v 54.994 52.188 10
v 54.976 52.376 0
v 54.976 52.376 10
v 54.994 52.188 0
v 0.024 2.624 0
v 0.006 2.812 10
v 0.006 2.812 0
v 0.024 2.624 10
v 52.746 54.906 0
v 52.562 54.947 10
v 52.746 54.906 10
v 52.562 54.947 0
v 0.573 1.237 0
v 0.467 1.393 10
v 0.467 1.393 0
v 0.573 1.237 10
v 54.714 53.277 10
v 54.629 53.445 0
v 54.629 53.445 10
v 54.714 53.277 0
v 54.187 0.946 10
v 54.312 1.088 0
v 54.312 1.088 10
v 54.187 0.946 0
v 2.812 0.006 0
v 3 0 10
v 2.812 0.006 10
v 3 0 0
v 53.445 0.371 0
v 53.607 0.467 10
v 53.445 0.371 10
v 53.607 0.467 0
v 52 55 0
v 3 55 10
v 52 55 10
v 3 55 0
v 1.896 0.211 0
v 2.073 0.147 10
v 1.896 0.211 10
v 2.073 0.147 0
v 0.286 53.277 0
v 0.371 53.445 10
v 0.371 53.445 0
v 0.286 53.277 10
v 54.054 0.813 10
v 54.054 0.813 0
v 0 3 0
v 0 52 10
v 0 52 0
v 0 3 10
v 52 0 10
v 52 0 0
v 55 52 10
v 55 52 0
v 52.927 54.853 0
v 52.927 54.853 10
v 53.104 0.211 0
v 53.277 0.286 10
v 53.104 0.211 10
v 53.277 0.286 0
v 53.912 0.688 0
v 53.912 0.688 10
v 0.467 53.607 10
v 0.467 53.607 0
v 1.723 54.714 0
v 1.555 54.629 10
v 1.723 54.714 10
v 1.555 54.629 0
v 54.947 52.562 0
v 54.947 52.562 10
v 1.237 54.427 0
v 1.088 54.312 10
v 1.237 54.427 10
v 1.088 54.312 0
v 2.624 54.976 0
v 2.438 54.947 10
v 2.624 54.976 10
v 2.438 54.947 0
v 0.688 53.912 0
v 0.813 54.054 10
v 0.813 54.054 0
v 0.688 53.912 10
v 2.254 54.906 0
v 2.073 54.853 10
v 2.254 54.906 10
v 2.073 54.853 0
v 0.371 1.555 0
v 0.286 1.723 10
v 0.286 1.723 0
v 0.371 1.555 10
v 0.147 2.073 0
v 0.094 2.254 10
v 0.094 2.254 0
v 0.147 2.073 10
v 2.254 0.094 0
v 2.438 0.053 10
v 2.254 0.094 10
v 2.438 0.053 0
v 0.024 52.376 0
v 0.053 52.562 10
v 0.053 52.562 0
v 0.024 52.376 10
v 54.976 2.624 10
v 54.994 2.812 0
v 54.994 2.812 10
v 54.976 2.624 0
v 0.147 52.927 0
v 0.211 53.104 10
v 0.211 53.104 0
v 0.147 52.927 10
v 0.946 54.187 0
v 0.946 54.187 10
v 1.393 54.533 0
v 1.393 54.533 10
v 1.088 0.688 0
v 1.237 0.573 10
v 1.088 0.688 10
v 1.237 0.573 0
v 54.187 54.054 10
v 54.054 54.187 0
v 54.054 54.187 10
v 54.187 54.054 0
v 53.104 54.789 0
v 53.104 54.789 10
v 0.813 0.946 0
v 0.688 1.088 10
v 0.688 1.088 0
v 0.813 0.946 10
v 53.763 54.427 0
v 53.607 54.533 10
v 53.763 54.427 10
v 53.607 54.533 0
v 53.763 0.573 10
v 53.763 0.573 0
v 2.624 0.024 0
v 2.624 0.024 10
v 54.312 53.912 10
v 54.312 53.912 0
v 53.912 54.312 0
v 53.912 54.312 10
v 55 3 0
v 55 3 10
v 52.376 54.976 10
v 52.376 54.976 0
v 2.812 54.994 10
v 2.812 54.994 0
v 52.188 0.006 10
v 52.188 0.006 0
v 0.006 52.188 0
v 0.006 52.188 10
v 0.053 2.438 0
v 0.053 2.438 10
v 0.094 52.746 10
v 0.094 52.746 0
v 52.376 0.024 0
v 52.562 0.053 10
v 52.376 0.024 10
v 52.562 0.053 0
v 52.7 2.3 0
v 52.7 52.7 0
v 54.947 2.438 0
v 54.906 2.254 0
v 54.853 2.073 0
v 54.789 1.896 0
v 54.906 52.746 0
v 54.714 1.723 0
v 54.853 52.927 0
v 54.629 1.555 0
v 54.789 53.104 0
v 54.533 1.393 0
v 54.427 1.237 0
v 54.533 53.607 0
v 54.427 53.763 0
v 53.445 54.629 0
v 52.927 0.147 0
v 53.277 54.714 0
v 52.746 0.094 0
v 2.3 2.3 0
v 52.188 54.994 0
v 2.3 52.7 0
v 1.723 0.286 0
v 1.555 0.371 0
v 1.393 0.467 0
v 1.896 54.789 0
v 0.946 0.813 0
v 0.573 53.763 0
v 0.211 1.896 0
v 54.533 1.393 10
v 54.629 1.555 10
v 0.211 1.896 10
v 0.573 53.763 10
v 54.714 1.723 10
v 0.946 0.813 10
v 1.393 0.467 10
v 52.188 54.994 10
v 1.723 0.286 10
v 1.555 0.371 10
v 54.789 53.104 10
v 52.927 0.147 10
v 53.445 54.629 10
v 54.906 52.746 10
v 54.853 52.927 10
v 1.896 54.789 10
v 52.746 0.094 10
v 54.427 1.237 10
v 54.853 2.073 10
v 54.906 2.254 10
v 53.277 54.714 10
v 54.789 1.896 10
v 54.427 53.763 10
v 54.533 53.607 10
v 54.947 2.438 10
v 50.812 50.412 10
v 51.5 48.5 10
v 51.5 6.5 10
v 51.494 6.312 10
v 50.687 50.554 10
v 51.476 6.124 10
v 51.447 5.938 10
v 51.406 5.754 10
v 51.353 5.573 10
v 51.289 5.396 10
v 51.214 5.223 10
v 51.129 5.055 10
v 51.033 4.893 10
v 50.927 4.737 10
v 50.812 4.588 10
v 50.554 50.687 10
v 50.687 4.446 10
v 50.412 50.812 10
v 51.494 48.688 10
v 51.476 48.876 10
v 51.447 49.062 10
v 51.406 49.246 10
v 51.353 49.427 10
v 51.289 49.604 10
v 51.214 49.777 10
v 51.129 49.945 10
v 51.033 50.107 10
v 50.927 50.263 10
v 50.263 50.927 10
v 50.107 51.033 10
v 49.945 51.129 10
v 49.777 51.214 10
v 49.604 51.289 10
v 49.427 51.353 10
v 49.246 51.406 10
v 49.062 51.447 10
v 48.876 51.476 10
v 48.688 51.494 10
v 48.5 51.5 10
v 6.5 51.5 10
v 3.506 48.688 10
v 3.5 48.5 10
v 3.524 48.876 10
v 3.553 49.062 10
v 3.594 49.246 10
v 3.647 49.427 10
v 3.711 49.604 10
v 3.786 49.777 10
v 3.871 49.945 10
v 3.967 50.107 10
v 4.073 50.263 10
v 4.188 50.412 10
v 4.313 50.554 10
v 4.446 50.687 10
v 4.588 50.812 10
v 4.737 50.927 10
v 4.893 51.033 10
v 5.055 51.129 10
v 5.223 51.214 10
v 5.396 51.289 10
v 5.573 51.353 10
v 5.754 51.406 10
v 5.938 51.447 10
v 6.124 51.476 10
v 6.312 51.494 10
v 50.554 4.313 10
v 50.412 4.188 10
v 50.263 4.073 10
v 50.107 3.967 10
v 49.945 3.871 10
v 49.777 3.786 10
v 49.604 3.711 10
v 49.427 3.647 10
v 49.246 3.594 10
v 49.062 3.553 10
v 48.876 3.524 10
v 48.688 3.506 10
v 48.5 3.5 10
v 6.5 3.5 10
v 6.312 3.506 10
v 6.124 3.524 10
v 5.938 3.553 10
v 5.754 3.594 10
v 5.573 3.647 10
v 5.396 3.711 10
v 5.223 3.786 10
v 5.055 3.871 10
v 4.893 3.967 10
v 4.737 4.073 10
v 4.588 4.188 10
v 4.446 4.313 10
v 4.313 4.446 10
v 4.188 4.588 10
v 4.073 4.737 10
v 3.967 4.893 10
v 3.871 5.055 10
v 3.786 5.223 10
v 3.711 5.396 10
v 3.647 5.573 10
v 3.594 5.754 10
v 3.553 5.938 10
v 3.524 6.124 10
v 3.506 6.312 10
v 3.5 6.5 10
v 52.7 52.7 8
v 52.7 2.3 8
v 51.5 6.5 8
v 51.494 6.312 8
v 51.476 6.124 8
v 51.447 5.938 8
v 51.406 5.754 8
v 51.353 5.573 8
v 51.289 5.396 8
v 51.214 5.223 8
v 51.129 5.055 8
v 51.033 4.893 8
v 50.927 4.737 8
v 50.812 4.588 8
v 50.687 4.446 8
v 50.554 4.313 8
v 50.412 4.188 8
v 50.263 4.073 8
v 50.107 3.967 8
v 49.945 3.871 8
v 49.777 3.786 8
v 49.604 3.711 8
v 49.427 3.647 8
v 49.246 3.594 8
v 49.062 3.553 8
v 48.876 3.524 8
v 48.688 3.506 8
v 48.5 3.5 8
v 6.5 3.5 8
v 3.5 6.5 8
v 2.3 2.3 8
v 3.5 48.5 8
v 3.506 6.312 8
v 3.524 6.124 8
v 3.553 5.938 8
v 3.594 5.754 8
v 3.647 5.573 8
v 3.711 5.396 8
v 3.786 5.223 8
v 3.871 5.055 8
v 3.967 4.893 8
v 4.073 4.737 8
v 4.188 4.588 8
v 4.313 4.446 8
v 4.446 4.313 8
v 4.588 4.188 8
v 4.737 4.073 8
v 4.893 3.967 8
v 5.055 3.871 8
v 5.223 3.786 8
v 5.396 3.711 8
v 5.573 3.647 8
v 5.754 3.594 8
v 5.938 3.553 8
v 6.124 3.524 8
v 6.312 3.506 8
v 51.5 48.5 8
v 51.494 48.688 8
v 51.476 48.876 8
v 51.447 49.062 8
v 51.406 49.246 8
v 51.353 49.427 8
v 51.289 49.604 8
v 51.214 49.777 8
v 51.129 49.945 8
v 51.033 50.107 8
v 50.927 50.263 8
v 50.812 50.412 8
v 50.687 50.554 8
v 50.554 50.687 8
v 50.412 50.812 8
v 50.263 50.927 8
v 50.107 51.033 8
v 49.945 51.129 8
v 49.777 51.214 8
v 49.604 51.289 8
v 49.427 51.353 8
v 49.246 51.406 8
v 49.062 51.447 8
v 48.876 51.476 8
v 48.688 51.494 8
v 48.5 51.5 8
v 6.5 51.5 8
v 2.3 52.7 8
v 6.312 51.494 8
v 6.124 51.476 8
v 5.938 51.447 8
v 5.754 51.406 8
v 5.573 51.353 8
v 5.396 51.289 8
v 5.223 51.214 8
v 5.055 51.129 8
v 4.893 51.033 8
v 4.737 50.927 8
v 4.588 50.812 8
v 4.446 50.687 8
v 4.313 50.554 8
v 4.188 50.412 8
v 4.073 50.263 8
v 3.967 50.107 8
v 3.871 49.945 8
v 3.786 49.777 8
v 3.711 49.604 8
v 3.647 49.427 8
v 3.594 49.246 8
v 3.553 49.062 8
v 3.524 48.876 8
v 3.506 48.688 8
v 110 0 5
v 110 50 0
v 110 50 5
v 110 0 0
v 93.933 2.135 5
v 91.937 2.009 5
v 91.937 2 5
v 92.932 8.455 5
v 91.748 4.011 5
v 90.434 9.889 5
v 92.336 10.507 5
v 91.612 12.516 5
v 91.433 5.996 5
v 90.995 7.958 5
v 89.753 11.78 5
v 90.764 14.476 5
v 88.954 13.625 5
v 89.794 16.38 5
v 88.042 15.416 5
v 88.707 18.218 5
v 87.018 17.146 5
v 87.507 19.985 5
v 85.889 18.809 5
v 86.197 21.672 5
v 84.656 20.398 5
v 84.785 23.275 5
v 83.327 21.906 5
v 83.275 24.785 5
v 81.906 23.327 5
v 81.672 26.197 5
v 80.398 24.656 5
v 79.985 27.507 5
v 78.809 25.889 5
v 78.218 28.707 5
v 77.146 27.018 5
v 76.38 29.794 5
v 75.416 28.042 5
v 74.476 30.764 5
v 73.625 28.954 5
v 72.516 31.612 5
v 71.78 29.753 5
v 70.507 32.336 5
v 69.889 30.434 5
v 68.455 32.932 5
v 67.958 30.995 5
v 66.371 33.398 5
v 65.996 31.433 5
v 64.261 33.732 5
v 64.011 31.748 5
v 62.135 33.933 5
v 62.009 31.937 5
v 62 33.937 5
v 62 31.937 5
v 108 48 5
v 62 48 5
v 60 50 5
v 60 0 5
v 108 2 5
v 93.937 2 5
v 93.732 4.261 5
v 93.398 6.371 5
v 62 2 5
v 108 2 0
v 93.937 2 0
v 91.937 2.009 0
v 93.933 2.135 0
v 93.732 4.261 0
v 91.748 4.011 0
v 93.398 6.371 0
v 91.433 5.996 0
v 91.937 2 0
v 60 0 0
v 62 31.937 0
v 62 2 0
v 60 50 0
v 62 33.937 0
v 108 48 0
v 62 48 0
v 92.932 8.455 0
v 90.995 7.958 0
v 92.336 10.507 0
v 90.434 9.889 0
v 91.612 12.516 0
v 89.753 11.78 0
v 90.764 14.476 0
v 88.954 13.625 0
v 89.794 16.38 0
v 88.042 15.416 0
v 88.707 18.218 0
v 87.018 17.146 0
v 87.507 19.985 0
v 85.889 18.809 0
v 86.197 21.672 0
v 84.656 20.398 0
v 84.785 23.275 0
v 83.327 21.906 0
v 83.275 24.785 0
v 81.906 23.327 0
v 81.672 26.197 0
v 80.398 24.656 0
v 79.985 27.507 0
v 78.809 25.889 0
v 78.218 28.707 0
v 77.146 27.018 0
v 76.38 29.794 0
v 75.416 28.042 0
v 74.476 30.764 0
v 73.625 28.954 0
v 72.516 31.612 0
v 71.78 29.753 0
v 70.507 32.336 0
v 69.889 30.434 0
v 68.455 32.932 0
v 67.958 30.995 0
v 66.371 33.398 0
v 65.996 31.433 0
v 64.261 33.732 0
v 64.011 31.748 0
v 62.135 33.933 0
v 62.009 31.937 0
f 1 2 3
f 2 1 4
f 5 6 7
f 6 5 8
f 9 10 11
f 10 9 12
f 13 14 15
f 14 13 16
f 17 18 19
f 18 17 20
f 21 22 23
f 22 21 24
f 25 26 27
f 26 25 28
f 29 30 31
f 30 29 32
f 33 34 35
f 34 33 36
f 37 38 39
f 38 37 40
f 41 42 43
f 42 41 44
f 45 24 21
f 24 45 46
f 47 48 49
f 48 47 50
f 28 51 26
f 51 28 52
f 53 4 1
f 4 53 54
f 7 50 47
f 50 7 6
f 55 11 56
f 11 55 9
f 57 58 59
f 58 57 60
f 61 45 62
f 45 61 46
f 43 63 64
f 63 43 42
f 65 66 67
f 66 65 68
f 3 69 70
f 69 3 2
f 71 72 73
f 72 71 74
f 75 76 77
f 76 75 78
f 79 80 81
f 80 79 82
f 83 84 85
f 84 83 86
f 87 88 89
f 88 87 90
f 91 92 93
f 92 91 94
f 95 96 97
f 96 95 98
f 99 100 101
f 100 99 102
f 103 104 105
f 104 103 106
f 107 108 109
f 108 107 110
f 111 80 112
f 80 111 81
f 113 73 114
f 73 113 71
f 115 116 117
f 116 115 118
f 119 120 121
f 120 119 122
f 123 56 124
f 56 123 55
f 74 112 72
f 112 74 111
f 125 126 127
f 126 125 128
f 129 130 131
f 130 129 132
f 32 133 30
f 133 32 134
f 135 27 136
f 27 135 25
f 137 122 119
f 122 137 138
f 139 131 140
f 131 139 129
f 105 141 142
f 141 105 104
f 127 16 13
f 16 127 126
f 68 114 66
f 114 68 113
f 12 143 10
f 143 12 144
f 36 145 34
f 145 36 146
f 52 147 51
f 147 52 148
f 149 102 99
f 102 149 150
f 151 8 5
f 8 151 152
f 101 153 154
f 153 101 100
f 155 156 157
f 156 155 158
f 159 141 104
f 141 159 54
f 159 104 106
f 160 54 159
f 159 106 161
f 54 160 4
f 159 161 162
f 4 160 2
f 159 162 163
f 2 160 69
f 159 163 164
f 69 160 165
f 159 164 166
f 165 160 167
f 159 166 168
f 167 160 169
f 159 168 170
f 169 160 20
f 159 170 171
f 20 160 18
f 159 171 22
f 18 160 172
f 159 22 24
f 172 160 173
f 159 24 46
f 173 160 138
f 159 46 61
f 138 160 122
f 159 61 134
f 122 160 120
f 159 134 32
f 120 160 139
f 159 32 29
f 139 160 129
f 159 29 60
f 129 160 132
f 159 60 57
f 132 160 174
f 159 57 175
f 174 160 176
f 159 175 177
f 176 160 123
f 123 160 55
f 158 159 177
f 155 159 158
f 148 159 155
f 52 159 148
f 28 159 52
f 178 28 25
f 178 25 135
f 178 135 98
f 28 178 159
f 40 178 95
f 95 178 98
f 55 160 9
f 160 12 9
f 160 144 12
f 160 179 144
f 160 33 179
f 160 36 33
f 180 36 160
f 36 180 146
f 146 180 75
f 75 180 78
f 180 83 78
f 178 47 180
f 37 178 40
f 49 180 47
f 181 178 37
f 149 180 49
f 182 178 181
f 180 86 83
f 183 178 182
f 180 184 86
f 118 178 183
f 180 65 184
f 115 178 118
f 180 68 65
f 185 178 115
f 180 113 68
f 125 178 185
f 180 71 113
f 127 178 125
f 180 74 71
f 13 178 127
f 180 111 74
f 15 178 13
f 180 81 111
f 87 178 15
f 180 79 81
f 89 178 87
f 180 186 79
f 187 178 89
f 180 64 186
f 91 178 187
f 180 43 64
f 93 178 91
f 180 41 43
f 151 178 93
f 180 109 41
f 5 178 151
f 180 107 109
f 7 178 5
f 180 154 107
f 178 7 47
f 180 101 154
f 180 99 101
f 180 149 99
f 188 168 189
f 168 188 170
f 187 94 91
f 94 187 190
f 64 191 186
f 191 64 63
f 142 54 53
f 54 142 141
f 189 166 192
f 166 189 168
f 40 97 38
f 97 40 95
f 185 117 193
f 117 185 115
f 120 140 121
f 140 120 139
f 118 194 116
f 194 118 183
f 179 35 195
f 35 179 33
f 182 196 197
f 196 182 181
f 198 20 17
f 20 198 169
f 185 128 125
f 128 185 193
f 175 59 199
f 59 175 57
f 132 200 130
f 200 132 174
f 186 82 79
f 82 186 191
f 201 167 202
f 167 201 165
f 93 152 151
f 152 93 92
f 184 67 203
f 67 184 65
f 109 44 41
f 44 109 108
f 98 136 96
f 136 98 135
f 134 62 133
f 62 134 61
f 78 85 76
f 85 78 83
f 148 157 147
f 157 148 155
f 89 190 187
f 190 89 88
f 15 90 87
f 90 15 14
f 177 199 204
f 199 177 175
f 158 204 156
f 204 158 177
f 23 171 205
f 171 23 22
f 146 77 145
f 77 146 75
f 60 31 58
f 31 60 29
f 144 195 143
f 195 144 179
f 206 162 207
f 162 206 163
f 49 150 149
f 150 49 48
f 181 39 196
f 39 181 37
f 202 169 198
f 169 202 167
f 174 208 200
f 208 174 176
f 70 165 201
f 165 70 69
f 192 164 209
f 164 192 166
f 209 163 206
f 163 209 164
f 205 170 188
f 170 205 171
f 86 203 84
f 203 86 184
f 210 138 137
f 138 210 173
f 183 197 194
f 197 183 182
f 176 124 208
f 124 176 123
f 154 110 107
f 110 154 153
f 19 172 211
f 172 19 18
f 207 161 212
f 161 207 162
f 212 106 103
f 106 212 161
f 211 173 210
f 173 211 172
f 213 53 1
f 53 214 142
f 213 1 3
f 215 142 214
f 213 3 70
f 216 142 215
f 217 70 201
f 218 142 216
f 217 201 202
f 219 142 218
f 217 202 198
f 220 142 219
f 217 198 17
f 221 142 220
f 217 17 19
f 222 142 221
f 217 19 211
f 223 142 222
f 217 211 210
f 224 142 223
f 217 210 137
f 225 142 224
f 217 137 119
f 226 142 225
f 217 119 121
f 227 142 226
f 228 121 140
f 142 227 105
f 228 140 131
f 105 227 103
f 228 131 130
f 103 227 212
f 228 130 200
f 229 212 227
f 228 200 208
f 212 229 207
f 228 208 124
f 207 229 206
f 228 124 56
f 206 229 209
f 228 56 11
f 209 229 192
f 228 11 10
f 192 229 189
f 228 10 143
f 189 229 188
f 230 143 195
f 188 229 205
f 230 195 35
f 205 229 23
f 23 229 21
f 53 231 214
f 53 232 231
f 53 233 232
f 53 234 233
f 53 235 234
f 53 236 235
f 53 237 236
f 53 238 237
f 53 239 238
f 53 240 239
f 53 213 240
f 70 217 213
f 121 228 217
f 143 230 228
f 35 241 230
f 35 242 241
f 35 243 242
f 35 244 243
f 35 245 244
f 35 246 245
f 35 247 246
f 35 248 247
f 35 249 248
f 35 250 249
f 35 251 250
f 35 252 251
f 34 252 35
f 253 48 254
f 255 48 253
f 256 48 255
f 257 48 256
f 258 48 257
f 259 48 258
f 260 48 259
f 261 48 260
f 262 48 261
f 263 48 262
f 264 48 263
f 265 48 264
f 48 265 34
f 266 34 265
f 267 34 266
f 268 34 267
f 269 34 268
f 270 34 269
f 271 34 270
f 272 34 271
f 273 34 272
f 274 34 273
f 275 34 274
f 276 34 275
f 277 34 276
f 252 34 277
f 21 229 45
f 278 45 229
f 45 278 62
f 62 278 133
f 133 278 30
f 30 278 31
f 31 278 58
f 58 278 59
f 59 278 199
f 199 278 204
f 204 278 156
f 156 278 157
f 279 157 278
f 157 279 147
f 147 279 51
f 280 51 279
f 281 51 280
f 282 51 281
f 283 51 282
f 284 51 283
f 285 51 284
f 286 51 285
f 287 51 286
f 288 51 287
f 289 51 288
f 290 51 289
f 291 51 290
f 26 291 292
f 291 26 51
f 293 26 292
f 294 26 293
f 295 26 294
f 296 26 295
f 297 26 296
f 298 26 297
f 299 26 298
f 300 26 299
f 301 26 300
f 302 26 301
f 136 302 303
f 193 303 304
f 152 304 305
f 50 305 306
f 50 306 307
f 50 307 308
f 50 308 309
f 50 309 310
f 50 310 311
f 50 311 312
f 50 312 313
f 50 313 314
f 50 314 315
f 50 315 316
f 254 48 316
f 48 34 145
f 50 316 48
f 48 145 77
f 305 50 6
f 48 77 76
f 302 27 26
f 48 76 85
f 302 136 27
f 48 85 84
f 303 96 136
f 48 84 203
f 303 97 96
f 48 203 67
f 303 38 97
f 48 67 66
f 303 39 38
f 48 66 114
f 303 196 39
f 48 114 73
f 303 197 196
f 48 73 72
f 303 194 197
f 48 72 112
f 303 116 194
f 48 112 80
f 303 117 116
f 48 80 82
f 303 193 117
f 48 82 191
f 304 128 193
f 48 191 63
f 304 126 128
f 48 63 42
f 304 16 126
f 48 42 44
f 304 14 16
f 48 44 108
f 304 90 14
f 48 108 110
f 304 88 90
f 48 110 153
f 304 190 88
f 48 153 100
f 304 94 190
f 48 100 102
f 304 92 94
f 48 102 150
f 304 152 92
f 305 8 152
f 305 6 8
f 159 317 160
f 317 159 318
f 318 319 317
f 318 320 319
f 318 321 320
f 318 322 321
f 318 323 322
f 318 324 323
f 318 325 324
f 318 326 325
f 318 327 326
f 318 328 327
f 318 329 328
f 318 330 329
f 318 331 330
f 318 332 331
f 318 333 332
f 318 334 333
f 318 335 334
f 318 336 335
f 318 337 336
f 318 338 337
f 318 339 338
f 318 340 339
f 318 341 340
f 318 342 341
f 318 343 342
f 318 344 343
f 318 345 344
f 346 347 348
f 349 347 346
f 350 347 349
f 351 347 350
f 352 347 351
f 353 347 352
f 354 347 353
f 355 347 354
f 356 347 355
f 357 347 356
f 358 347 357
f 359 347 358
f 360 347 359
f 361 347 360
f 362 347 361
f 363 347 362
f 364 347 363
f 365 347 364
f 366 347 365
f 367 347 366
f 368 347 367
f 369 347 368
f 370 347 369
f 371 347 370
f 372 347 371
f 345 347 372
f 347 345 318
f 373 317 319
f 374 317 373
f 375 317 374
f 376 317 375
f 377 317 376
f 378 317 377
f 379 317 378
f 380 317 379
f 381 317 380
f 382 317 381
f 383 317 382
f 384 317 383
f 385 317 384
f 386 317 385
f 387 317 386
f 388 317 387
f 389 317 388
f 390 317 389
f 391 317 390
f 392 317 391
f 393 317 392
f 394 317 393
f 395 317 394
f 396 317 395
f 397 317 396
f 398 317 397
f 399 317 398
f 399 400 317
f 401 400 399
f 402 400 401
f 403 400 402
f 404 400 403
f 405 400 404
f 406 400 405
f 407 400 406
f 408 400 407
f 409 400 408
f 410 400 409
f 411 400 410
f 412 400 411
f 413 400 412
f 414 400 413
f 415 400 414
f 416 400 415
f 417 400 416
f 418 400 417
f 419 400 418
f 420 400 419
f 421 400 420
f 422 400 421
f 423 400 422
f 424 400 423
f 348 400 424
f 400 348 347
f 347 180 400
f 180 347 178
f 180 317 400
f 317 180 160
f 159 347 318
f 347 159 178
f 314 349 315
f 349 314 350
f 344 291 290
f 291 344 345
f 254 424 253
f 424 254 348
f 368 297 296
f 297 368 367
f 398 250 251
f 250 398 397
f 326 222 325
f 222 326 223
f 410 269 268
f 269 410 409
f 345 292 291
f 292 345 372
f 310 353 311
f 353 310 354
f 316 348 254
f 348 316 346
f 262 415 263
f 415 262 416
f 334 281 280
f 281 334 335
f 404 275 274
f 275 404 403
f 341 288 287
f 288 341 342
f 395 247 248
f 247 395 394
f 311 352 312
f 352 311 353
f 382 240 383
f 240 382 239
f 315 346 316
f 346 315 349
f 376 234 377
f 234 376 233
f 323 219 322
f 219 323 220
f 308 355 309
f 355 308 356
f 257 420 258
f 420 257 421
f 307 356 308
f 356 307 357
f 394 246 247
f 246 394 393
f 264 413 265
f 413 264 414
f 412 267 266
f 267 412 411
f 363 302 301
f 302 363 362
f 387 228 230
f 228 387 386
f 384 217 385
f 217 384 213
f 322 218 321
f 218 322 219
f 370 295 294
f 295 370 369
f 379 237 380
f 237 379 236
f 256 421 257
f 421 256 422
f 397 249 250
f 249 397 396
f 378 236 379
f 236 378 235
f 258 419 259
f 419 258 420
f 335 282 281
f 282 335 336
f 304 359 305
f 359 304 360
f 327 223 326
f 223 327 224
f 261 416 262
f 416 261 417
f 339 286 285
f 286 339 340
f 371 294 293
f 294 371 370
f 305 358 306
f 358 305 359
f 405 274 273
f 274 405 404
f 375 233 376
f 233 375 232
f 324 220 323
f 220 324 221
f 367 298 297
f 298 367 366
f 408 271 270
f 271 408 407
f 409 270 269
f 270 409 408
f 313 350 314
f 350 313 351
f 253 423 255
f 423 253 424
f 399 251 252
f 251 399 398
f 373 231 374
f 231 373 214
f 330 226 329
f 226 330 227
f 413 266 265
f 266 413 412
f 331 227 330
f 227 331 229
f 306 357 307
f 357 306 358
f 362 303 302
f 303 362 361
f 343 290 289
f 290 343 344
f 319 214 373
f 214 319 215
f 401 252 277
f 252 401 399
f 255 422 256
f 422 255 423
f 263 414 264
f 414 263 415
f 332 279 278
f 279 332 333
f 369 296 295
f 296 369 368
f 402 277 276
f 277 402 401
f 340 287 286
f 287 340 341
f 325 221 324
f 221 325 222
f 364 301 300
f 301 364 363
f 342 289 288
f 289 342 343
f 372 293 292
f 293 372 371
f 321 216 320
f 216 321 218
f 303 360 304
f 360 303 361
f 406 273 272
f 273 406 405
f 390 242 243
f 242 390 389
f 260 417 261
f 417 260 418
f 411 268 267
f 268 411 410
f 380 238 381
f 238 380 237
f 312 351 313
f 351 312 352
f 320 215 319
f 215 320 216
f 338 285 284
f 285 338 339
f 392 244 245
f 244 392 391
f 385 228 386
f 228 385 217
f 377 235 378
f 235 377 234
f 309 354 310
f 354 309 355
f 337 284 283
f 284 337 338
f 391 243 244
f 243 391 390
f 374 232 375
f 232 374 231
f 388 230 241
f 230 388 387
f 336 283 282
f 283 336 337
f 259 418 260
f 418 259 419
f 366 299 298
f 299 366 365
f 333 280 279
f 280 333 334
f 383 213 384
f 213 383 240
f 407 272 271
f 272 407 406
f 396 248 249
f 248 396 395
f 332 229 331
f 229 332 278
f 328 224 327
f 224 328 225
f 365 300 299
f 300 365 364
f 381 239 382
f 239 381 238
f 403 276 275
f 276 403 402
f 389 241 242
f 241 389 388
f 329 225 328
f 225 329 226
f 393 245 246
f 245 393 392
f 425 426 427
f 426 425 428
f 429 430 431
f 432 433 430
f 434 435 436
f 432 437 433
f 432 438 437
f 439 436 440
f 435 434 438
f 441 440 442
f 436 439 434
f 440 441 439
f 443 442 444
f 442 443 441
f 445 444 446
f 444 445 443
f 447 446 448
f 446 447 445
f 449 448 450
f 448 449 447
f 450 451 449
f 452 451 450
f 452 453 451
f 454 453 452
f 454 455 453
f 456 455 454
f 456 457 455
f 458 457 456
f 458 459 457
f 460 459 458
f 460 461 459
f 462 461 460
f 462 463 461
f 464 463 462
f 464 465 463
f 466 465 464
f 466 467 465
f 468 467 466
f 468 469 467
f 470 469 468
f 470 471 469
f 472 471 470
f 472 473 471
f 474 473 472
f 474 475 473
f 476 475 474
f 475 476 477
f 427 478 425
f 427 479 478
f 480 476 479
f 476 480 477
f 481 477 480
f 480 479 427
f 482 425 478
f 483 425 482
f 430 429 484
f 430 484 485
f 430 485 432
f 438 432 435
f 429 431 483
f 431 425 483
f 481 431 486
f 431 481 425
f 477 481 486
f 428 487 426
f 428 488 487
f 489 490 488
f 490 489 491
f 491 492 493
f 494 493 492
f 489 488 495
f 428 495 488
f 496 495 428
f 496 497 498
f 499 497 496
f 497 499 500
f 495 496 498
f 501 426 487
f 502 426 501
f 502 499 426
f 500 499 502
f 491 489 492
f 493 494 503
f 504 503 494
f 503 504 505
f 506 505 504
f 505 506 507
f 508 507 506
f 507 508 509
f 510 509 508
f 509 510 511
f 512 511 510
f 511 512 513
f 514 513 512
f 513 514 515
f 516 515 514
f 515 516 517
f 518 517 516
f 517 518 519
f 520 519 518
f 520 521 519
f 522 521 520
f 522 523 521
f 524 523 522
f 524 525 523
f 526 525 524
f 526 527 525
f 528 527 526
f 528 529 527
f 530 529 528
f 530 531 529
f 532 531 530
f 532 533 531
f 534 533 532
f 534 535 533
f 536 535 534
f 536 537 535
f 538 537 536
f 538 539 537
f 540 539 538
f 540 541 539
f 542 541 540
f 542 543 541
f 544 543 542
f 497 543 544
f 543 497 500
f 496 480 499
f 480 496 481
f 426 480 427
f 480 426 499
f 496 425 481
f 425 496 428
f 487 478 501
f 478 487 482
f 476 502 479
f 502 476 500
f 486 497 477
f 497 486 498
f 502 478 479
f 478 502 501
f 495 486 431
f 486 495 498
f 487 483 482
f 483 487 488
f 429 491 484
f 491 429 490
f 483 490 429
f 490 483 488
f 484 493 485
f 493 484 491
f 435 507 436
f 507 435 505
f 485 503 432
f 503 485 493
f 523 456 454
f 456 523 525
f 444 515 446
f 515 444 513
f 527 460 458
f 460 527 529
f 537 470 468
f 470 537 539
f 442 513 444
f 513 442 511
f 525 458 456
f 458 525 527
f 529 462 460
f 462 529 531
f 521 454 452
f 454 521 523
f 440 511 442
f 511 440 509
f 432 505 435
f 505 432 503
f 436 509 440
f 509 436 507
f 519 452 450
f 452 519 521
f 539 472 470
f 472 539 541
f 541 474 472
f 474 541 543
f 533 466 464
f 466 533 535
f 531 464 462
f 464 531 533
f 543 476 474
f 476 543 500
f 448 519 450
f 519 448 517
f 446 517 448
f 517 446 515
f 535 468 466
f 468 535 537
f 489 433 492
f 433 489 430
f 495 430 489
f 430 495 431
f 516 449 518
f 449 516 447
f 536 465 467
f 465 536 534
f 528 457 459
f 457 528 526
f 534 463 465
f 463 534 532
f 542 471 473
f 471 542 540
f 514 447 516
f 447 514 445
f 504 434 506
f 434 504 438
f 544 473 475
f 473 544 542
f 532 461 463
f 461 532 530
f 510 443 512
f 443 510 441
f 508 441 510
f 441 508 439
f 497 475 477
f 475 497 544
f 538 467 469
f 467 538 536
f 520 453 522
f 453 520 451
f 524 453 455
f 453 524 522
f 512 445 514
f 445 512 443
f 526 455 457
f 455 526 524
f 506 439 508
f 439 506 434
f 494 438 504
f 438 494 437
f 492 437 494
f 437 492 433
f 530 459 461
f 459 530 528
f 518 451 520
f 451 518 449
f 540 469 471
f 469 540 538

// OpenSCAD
//this is the PCB. I don't think I actually need it...
//import("/home/nanik/Documents/myProjects/cat_shooting_star_sao/shooting_star_sao/shooting_star_sao.stl");

board_tolerance = 0.2;

module rounded_cube(x,y,z,r) {
    
    hull(){
        translate([r,r,0])cylinder(h=z, r=r, $fn=100);
        translate([r,y-r,0])cylinder(h=z, r=r, $fn=100);
        translate([x-r,r,0])cylinder(h=z, r=r, $fn=100);
        translate([x-r,y-r,0])cylinder(h=z, r=r, $fn=100);
    }
}


module frame() {
difference() {
    rounded_cube(55,55,10,3);
    translate([2.5-board_tolerance, 2.5-board_tolerance,0])cube([50+(2*board_tolerance), 50+(2*board_tolerance), 8]);
    translate([2.5+1, 2.5+1,0])rounded_cube(48, 48, 12,3);
}
}

module support() {
difference() {
    cube([50,50,5]);
    translate([2,2,0])cube([46,46,5]);
}

intersection(){
    cube([50,50,5]);
    difference() {
        cylinder(r=34,h=5, $fn=100);
        cylinder(r=32,h=5, $fn=100);
    }
}
}

//cube([55, 55, 2]);

frame();

translate([60,0,0])support();
